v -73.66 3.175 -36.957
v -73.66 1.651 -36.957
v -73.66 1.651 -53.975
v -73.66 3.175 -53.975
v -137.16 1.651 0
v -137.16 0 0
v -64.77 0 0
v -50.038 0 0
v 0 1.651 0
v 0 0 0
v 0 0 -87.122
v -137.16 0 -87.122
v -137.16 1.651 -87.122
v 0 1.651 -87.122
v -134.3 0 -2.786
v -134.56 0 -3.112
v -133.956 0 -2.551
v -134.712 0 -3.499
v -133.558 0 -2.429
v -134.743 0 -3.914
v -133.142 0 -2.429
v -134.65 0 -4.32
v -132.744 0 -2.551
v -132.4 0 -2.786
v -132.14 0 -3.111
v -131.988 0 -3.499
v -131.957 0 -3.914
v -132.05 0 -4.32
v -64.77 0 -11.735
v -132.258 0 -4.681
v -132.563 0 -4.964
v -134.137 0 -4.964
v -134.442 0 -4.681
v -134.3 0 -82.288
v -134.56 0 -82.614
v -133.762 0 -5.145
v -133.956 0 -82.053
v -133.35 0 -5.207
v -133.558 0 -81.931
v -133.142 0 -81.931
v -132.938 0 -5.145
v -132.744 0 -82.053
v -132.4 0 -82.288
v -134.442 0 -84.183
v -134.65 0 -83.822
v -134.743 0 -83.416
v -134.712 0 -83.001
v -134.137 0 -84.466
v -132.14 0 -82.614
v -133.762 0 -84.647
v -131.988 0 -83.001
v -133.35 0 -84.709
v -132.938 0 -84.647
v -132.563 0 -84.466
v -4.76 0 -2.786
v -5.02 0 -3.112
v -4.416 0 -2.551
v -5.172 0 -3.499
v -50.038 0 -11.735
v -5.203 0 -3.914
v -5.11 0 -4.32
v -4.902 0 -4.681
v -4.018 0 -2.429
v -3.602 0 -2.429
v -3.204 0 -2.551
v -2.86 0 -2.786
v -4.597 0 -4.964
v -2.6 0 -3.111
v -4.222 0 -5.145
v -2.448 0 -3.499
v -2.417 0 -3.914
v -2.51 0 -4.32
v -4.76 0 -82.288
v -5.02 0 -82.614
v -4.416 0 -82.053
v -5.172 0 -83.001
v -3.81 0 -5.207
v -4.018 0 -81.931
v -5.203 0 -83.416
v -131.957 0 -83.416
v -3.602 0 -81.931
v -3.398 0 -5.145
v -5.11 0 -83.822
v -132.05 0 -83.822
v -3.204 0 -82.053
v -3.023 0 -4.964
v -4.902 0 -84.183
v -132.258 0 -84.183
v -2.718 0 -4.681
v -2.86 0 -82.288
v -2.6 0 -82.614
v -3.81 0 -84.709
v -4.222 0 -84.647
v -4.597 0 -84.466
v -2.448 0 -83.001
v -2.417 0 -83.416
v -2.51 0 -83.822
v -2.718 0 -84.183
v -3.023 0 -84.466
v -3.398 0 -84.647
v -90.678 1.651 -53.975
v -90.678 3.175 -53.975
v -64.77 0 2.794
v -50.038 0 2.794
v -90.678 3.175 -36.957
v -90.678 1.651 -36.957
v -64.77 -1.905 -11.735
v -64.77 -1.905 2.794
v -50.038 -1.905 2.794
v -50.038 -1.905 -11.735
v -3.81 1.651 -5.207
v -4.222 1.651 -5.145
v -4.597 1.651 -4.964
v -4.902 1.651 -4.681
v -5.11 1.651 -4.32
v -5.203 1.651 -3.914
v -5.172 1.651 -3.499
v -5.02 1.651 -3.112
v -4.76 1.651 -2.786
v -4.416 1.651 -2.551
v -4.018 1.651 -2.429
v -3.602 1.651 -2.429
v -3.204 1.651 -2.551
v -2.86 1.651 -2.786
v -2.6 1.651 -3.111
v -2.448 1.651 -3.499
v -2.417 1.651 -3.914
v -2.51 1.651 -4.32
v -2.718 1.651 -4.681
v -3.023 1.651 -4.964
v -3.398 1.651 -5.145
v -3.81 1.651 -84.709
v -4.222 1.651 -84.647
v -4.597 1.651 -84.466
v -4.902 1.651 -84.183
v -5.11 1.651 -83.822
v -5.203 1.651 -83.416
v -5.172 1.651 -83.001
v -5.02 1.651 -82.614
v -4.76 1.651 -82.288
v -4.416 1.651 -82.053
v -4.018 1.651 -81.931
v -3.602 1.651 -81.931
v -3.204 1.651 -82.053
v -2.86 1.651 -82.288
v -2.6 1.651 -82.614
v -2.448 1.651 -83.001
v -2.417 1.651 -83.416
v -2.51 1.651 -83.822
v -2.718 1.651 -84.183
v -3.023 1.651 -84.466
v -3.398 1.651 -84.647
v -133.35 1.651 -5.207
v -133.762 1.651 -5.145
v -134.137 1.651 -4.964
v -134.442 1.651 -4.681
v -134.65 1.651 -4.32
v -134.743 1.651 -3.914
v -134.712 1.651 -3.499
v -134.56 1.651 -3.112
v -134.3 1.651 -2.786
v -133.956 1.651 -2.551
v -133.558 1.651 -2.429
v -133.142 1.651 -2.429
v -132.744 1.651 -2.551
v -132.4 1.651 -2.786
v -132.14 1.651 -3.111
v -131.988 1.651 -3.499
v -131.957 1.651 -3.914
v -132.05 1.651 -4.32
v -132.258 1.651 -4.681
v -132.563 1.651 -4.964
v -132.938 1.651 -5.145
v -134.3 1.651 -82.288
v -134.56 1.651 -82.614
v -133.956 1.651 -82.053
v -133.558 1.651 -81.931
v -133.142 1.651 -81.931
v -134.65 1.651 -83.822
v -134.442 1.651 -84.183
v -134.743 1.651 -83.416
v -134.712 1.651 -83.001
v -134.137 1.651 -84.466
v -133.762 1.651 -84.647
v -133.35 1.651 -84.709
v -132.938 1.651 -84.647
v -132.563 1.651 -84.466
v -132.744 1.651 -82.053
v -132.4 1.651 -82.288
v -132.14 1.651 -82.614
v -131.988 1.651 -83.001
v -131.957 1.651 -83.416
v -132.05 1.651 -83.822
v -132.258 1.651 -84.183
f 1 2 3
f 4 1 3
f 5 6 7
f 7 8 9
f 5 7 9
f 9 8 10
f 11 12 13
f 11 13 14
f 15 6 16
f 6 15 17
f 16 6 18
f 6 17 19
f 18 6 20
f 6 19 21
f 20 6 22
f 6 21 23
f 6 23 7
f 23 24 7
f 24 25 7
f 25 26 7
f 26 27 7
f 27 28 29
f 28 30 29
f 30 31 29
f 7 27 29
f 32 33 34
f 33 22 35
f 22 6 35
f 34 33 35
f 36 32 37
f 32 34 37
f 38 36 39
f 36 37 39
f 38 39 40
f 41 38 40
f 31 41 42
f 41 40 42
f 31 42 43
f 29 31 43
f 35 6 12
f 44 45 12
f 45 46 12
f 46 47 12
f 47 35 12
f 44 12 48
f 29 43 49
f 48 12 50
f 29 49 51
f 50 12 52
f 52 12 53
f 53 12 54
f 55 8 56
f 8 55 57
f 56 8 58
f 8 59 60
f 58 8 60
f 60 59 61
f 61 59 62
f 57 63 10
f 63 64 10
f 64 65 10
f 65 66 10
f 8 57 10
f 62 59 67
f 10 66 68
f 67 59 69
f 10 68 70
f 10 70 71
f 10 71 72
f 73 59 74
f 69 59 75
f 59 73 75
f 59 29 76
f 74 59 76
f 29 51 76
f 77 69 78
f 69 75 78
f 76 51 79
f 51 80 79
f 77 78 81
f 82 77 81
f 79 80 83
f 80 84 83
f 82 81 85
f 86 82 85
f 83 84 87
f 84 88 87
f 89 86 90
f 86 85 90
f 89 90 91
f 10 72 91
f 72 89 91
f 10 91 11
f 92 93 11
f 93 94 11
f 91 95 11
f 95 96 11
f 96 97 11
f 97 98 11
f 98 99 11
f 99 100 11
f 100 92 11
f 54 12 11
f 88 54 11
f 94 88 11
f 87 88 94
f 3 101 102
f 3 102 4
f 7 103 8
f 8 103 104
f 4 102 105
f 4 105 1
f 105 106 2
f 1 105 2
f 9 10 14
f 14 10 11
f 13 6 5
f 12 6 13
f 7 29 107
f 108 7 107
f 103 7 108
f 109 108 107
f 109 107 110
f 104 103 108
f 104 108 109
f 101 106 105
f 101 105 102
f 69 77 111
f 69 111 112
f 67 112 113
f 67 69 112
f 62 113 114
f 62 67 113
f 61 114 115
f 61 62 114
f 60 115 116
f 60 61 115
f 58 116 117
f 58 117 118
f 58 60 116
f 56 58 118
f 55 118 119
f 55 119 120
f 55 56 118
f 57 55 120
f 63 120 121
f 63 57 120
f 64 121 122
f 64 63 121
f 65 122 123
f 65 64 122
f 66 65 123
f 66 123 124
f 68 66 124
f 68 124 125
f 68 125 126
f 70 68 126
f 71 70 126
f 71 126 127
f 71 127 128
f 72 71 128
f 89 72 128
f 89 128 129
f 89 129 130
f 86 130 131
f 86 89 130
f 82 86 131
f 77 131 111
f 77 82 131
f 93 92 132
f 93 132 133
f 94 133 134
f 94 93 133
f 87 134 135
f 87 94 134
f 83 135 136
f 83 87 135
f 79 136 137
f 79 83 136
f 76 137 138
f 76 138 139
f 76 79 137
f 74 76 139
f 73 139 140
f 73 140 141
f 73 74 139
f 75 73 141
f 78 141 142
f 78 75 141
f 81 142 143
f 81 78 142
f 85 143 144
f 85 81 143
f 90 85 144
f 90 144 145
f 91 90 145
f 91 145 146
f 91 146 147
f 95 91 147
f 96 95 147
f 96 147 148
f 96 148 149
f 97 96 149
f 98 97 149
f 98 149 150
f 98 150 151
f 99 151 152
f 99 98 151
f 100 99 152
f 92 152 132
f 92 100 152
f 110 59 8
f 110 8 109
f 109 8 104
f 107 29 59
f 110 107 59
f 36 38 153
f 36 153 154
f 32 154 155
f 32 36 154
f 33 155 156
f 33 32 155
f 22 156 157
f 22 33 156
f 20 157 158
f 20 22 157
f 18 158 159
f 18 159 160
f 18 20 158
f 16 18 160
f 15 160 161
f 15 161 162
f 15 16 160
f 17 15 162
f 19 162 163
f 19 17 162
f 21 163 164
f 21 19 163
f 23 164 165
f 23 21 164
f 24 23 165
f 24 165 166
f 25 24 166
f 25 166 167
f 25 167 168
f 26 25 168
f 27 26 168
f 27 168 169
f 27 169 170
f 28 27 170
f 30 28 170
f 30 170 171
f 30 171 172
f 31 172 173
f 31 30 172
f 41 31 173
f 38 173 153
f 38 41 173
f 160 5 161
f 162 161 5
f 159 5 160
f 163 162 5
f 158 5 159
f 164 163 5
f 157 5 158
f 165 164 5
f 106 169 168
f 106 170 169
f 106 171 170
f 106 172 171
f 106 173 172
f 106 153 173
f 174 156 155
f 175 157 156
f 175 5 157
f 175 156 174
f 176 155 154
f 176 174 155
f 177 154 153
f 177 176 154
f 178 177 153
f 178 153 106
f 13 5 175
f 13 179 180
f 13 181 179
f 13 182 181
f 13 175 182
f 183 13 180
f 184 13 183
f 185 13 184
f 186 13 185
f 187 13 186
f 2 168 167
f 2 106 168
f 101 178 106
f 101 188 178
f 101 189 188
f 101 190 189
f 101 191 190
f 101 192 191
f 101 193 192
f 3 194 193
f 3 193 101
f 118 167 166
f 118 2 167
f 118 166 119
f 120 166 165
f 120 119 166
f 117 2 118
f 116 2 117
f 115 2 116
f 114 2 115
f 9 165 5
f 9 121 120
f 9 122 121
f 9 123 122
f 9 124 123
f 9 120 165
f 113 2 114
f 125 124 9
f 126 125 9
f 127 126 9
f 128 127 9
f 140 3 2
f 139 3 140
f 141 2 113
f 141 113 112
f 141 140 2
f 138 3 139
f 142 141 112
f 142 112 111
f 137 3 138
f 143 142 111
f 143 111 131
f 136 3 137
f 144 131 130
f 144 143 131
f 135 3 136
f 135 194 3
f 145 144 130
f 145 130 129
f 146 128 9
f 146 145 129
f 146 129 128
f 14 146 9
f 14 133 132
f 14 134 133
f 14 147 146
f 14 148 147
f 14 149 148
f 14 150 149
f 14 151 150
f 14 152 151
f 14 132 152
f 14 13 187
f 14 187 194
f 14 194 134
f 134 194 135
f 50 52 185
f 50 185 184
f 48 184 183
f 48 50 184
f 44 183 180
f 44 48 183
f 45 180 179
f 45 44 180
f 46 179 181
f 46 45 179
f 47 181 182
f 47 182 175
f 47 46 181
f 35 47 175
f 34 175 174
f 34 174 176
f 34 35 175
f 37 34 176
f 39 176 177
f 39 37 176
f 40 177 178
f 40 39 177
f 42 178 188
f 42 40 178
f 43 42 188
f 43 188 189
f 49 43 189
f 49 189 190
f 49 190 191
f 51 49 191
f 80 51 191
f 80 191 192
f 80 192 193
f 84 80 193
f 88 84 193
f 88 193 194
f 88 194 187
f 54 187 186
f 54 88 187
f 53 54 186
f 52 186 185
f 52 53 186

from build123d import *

# Parameters (mm, degrees)
SKETCH1_W           = 137.16
SKETCH1_H           = 87.122
SKETCH1_R           = 1.397
BOSS_EXTRUDE1_DEPTH = 1.651
SKETCH2_W           = 14.732
SKETCH2_H           = 14.5288
BOSS_EXTRUDE2_DEPTH = 1.905
SKETCH3_W           = 17.018
SKETCH3_H           = 17.018
BOSS_EXTRUDE3_DEPTH = 1.524


with BuildPart() as part:
    # Sketch1 → Boss-Extrude1 (new body)
    with BuildSketch(Plane(origin=(0, 0, 0), x_dir=(1, 0, 0), z_dir=(0, 1, 0))):
        with Locations((-68.58, 43.561)):
            Rectangle(SKETCH1_W, SKETCH1_H)
        with Locations(Location((-133.35, 83.312, 0), (0, 0, 90))):
            Circle(SKETCH1_R, mode=Mode.SUBTRACT)
        with Locations(Location((-3.81, 3.81, 0), (0, 0, 90))):
            Circle(SKETCH1_R, mode=Mode.SUBTRACT)
        with Locations(Location((-3.81, 83.312, 0), (0, 0, 90))):
            Circle(SKETCH1_R, mode=Mode.SUBTRACT)
        with Locations(Location((-133.35, 3.81, 0), (0, 0, 90))):
            Circle(SKETCH1_R, mode=Mode.SUBTRACT)
    extrude(amount=BOSS_EXTRUDE1_DEPTH)

    # Sketch2 → Boss-Extrude2 (add)
    with BuildSketch(Plane.XZ):
        with Locations((-57.404, -4.4704)):
            Rectangle(SKETCH2_W, SKETCH2_H)
    extrude(amount=BOSS_EXTRUDE2_DEPTH)

    # Sketch3 → Boss-Extrude3 (add)
    with BuildSketch(Plane(origin=(0, 1.651, 0), x_dir=(1, 0, 0), z_dir=(0, 1, 0))):
        with Locations((-82.169, 45.466)):
            Rectangle(SKETCH3_W, SKETCH3_H)
    extrude(amount=BOSS_EXTRUDE3_DEPTH)


solid = part.part
